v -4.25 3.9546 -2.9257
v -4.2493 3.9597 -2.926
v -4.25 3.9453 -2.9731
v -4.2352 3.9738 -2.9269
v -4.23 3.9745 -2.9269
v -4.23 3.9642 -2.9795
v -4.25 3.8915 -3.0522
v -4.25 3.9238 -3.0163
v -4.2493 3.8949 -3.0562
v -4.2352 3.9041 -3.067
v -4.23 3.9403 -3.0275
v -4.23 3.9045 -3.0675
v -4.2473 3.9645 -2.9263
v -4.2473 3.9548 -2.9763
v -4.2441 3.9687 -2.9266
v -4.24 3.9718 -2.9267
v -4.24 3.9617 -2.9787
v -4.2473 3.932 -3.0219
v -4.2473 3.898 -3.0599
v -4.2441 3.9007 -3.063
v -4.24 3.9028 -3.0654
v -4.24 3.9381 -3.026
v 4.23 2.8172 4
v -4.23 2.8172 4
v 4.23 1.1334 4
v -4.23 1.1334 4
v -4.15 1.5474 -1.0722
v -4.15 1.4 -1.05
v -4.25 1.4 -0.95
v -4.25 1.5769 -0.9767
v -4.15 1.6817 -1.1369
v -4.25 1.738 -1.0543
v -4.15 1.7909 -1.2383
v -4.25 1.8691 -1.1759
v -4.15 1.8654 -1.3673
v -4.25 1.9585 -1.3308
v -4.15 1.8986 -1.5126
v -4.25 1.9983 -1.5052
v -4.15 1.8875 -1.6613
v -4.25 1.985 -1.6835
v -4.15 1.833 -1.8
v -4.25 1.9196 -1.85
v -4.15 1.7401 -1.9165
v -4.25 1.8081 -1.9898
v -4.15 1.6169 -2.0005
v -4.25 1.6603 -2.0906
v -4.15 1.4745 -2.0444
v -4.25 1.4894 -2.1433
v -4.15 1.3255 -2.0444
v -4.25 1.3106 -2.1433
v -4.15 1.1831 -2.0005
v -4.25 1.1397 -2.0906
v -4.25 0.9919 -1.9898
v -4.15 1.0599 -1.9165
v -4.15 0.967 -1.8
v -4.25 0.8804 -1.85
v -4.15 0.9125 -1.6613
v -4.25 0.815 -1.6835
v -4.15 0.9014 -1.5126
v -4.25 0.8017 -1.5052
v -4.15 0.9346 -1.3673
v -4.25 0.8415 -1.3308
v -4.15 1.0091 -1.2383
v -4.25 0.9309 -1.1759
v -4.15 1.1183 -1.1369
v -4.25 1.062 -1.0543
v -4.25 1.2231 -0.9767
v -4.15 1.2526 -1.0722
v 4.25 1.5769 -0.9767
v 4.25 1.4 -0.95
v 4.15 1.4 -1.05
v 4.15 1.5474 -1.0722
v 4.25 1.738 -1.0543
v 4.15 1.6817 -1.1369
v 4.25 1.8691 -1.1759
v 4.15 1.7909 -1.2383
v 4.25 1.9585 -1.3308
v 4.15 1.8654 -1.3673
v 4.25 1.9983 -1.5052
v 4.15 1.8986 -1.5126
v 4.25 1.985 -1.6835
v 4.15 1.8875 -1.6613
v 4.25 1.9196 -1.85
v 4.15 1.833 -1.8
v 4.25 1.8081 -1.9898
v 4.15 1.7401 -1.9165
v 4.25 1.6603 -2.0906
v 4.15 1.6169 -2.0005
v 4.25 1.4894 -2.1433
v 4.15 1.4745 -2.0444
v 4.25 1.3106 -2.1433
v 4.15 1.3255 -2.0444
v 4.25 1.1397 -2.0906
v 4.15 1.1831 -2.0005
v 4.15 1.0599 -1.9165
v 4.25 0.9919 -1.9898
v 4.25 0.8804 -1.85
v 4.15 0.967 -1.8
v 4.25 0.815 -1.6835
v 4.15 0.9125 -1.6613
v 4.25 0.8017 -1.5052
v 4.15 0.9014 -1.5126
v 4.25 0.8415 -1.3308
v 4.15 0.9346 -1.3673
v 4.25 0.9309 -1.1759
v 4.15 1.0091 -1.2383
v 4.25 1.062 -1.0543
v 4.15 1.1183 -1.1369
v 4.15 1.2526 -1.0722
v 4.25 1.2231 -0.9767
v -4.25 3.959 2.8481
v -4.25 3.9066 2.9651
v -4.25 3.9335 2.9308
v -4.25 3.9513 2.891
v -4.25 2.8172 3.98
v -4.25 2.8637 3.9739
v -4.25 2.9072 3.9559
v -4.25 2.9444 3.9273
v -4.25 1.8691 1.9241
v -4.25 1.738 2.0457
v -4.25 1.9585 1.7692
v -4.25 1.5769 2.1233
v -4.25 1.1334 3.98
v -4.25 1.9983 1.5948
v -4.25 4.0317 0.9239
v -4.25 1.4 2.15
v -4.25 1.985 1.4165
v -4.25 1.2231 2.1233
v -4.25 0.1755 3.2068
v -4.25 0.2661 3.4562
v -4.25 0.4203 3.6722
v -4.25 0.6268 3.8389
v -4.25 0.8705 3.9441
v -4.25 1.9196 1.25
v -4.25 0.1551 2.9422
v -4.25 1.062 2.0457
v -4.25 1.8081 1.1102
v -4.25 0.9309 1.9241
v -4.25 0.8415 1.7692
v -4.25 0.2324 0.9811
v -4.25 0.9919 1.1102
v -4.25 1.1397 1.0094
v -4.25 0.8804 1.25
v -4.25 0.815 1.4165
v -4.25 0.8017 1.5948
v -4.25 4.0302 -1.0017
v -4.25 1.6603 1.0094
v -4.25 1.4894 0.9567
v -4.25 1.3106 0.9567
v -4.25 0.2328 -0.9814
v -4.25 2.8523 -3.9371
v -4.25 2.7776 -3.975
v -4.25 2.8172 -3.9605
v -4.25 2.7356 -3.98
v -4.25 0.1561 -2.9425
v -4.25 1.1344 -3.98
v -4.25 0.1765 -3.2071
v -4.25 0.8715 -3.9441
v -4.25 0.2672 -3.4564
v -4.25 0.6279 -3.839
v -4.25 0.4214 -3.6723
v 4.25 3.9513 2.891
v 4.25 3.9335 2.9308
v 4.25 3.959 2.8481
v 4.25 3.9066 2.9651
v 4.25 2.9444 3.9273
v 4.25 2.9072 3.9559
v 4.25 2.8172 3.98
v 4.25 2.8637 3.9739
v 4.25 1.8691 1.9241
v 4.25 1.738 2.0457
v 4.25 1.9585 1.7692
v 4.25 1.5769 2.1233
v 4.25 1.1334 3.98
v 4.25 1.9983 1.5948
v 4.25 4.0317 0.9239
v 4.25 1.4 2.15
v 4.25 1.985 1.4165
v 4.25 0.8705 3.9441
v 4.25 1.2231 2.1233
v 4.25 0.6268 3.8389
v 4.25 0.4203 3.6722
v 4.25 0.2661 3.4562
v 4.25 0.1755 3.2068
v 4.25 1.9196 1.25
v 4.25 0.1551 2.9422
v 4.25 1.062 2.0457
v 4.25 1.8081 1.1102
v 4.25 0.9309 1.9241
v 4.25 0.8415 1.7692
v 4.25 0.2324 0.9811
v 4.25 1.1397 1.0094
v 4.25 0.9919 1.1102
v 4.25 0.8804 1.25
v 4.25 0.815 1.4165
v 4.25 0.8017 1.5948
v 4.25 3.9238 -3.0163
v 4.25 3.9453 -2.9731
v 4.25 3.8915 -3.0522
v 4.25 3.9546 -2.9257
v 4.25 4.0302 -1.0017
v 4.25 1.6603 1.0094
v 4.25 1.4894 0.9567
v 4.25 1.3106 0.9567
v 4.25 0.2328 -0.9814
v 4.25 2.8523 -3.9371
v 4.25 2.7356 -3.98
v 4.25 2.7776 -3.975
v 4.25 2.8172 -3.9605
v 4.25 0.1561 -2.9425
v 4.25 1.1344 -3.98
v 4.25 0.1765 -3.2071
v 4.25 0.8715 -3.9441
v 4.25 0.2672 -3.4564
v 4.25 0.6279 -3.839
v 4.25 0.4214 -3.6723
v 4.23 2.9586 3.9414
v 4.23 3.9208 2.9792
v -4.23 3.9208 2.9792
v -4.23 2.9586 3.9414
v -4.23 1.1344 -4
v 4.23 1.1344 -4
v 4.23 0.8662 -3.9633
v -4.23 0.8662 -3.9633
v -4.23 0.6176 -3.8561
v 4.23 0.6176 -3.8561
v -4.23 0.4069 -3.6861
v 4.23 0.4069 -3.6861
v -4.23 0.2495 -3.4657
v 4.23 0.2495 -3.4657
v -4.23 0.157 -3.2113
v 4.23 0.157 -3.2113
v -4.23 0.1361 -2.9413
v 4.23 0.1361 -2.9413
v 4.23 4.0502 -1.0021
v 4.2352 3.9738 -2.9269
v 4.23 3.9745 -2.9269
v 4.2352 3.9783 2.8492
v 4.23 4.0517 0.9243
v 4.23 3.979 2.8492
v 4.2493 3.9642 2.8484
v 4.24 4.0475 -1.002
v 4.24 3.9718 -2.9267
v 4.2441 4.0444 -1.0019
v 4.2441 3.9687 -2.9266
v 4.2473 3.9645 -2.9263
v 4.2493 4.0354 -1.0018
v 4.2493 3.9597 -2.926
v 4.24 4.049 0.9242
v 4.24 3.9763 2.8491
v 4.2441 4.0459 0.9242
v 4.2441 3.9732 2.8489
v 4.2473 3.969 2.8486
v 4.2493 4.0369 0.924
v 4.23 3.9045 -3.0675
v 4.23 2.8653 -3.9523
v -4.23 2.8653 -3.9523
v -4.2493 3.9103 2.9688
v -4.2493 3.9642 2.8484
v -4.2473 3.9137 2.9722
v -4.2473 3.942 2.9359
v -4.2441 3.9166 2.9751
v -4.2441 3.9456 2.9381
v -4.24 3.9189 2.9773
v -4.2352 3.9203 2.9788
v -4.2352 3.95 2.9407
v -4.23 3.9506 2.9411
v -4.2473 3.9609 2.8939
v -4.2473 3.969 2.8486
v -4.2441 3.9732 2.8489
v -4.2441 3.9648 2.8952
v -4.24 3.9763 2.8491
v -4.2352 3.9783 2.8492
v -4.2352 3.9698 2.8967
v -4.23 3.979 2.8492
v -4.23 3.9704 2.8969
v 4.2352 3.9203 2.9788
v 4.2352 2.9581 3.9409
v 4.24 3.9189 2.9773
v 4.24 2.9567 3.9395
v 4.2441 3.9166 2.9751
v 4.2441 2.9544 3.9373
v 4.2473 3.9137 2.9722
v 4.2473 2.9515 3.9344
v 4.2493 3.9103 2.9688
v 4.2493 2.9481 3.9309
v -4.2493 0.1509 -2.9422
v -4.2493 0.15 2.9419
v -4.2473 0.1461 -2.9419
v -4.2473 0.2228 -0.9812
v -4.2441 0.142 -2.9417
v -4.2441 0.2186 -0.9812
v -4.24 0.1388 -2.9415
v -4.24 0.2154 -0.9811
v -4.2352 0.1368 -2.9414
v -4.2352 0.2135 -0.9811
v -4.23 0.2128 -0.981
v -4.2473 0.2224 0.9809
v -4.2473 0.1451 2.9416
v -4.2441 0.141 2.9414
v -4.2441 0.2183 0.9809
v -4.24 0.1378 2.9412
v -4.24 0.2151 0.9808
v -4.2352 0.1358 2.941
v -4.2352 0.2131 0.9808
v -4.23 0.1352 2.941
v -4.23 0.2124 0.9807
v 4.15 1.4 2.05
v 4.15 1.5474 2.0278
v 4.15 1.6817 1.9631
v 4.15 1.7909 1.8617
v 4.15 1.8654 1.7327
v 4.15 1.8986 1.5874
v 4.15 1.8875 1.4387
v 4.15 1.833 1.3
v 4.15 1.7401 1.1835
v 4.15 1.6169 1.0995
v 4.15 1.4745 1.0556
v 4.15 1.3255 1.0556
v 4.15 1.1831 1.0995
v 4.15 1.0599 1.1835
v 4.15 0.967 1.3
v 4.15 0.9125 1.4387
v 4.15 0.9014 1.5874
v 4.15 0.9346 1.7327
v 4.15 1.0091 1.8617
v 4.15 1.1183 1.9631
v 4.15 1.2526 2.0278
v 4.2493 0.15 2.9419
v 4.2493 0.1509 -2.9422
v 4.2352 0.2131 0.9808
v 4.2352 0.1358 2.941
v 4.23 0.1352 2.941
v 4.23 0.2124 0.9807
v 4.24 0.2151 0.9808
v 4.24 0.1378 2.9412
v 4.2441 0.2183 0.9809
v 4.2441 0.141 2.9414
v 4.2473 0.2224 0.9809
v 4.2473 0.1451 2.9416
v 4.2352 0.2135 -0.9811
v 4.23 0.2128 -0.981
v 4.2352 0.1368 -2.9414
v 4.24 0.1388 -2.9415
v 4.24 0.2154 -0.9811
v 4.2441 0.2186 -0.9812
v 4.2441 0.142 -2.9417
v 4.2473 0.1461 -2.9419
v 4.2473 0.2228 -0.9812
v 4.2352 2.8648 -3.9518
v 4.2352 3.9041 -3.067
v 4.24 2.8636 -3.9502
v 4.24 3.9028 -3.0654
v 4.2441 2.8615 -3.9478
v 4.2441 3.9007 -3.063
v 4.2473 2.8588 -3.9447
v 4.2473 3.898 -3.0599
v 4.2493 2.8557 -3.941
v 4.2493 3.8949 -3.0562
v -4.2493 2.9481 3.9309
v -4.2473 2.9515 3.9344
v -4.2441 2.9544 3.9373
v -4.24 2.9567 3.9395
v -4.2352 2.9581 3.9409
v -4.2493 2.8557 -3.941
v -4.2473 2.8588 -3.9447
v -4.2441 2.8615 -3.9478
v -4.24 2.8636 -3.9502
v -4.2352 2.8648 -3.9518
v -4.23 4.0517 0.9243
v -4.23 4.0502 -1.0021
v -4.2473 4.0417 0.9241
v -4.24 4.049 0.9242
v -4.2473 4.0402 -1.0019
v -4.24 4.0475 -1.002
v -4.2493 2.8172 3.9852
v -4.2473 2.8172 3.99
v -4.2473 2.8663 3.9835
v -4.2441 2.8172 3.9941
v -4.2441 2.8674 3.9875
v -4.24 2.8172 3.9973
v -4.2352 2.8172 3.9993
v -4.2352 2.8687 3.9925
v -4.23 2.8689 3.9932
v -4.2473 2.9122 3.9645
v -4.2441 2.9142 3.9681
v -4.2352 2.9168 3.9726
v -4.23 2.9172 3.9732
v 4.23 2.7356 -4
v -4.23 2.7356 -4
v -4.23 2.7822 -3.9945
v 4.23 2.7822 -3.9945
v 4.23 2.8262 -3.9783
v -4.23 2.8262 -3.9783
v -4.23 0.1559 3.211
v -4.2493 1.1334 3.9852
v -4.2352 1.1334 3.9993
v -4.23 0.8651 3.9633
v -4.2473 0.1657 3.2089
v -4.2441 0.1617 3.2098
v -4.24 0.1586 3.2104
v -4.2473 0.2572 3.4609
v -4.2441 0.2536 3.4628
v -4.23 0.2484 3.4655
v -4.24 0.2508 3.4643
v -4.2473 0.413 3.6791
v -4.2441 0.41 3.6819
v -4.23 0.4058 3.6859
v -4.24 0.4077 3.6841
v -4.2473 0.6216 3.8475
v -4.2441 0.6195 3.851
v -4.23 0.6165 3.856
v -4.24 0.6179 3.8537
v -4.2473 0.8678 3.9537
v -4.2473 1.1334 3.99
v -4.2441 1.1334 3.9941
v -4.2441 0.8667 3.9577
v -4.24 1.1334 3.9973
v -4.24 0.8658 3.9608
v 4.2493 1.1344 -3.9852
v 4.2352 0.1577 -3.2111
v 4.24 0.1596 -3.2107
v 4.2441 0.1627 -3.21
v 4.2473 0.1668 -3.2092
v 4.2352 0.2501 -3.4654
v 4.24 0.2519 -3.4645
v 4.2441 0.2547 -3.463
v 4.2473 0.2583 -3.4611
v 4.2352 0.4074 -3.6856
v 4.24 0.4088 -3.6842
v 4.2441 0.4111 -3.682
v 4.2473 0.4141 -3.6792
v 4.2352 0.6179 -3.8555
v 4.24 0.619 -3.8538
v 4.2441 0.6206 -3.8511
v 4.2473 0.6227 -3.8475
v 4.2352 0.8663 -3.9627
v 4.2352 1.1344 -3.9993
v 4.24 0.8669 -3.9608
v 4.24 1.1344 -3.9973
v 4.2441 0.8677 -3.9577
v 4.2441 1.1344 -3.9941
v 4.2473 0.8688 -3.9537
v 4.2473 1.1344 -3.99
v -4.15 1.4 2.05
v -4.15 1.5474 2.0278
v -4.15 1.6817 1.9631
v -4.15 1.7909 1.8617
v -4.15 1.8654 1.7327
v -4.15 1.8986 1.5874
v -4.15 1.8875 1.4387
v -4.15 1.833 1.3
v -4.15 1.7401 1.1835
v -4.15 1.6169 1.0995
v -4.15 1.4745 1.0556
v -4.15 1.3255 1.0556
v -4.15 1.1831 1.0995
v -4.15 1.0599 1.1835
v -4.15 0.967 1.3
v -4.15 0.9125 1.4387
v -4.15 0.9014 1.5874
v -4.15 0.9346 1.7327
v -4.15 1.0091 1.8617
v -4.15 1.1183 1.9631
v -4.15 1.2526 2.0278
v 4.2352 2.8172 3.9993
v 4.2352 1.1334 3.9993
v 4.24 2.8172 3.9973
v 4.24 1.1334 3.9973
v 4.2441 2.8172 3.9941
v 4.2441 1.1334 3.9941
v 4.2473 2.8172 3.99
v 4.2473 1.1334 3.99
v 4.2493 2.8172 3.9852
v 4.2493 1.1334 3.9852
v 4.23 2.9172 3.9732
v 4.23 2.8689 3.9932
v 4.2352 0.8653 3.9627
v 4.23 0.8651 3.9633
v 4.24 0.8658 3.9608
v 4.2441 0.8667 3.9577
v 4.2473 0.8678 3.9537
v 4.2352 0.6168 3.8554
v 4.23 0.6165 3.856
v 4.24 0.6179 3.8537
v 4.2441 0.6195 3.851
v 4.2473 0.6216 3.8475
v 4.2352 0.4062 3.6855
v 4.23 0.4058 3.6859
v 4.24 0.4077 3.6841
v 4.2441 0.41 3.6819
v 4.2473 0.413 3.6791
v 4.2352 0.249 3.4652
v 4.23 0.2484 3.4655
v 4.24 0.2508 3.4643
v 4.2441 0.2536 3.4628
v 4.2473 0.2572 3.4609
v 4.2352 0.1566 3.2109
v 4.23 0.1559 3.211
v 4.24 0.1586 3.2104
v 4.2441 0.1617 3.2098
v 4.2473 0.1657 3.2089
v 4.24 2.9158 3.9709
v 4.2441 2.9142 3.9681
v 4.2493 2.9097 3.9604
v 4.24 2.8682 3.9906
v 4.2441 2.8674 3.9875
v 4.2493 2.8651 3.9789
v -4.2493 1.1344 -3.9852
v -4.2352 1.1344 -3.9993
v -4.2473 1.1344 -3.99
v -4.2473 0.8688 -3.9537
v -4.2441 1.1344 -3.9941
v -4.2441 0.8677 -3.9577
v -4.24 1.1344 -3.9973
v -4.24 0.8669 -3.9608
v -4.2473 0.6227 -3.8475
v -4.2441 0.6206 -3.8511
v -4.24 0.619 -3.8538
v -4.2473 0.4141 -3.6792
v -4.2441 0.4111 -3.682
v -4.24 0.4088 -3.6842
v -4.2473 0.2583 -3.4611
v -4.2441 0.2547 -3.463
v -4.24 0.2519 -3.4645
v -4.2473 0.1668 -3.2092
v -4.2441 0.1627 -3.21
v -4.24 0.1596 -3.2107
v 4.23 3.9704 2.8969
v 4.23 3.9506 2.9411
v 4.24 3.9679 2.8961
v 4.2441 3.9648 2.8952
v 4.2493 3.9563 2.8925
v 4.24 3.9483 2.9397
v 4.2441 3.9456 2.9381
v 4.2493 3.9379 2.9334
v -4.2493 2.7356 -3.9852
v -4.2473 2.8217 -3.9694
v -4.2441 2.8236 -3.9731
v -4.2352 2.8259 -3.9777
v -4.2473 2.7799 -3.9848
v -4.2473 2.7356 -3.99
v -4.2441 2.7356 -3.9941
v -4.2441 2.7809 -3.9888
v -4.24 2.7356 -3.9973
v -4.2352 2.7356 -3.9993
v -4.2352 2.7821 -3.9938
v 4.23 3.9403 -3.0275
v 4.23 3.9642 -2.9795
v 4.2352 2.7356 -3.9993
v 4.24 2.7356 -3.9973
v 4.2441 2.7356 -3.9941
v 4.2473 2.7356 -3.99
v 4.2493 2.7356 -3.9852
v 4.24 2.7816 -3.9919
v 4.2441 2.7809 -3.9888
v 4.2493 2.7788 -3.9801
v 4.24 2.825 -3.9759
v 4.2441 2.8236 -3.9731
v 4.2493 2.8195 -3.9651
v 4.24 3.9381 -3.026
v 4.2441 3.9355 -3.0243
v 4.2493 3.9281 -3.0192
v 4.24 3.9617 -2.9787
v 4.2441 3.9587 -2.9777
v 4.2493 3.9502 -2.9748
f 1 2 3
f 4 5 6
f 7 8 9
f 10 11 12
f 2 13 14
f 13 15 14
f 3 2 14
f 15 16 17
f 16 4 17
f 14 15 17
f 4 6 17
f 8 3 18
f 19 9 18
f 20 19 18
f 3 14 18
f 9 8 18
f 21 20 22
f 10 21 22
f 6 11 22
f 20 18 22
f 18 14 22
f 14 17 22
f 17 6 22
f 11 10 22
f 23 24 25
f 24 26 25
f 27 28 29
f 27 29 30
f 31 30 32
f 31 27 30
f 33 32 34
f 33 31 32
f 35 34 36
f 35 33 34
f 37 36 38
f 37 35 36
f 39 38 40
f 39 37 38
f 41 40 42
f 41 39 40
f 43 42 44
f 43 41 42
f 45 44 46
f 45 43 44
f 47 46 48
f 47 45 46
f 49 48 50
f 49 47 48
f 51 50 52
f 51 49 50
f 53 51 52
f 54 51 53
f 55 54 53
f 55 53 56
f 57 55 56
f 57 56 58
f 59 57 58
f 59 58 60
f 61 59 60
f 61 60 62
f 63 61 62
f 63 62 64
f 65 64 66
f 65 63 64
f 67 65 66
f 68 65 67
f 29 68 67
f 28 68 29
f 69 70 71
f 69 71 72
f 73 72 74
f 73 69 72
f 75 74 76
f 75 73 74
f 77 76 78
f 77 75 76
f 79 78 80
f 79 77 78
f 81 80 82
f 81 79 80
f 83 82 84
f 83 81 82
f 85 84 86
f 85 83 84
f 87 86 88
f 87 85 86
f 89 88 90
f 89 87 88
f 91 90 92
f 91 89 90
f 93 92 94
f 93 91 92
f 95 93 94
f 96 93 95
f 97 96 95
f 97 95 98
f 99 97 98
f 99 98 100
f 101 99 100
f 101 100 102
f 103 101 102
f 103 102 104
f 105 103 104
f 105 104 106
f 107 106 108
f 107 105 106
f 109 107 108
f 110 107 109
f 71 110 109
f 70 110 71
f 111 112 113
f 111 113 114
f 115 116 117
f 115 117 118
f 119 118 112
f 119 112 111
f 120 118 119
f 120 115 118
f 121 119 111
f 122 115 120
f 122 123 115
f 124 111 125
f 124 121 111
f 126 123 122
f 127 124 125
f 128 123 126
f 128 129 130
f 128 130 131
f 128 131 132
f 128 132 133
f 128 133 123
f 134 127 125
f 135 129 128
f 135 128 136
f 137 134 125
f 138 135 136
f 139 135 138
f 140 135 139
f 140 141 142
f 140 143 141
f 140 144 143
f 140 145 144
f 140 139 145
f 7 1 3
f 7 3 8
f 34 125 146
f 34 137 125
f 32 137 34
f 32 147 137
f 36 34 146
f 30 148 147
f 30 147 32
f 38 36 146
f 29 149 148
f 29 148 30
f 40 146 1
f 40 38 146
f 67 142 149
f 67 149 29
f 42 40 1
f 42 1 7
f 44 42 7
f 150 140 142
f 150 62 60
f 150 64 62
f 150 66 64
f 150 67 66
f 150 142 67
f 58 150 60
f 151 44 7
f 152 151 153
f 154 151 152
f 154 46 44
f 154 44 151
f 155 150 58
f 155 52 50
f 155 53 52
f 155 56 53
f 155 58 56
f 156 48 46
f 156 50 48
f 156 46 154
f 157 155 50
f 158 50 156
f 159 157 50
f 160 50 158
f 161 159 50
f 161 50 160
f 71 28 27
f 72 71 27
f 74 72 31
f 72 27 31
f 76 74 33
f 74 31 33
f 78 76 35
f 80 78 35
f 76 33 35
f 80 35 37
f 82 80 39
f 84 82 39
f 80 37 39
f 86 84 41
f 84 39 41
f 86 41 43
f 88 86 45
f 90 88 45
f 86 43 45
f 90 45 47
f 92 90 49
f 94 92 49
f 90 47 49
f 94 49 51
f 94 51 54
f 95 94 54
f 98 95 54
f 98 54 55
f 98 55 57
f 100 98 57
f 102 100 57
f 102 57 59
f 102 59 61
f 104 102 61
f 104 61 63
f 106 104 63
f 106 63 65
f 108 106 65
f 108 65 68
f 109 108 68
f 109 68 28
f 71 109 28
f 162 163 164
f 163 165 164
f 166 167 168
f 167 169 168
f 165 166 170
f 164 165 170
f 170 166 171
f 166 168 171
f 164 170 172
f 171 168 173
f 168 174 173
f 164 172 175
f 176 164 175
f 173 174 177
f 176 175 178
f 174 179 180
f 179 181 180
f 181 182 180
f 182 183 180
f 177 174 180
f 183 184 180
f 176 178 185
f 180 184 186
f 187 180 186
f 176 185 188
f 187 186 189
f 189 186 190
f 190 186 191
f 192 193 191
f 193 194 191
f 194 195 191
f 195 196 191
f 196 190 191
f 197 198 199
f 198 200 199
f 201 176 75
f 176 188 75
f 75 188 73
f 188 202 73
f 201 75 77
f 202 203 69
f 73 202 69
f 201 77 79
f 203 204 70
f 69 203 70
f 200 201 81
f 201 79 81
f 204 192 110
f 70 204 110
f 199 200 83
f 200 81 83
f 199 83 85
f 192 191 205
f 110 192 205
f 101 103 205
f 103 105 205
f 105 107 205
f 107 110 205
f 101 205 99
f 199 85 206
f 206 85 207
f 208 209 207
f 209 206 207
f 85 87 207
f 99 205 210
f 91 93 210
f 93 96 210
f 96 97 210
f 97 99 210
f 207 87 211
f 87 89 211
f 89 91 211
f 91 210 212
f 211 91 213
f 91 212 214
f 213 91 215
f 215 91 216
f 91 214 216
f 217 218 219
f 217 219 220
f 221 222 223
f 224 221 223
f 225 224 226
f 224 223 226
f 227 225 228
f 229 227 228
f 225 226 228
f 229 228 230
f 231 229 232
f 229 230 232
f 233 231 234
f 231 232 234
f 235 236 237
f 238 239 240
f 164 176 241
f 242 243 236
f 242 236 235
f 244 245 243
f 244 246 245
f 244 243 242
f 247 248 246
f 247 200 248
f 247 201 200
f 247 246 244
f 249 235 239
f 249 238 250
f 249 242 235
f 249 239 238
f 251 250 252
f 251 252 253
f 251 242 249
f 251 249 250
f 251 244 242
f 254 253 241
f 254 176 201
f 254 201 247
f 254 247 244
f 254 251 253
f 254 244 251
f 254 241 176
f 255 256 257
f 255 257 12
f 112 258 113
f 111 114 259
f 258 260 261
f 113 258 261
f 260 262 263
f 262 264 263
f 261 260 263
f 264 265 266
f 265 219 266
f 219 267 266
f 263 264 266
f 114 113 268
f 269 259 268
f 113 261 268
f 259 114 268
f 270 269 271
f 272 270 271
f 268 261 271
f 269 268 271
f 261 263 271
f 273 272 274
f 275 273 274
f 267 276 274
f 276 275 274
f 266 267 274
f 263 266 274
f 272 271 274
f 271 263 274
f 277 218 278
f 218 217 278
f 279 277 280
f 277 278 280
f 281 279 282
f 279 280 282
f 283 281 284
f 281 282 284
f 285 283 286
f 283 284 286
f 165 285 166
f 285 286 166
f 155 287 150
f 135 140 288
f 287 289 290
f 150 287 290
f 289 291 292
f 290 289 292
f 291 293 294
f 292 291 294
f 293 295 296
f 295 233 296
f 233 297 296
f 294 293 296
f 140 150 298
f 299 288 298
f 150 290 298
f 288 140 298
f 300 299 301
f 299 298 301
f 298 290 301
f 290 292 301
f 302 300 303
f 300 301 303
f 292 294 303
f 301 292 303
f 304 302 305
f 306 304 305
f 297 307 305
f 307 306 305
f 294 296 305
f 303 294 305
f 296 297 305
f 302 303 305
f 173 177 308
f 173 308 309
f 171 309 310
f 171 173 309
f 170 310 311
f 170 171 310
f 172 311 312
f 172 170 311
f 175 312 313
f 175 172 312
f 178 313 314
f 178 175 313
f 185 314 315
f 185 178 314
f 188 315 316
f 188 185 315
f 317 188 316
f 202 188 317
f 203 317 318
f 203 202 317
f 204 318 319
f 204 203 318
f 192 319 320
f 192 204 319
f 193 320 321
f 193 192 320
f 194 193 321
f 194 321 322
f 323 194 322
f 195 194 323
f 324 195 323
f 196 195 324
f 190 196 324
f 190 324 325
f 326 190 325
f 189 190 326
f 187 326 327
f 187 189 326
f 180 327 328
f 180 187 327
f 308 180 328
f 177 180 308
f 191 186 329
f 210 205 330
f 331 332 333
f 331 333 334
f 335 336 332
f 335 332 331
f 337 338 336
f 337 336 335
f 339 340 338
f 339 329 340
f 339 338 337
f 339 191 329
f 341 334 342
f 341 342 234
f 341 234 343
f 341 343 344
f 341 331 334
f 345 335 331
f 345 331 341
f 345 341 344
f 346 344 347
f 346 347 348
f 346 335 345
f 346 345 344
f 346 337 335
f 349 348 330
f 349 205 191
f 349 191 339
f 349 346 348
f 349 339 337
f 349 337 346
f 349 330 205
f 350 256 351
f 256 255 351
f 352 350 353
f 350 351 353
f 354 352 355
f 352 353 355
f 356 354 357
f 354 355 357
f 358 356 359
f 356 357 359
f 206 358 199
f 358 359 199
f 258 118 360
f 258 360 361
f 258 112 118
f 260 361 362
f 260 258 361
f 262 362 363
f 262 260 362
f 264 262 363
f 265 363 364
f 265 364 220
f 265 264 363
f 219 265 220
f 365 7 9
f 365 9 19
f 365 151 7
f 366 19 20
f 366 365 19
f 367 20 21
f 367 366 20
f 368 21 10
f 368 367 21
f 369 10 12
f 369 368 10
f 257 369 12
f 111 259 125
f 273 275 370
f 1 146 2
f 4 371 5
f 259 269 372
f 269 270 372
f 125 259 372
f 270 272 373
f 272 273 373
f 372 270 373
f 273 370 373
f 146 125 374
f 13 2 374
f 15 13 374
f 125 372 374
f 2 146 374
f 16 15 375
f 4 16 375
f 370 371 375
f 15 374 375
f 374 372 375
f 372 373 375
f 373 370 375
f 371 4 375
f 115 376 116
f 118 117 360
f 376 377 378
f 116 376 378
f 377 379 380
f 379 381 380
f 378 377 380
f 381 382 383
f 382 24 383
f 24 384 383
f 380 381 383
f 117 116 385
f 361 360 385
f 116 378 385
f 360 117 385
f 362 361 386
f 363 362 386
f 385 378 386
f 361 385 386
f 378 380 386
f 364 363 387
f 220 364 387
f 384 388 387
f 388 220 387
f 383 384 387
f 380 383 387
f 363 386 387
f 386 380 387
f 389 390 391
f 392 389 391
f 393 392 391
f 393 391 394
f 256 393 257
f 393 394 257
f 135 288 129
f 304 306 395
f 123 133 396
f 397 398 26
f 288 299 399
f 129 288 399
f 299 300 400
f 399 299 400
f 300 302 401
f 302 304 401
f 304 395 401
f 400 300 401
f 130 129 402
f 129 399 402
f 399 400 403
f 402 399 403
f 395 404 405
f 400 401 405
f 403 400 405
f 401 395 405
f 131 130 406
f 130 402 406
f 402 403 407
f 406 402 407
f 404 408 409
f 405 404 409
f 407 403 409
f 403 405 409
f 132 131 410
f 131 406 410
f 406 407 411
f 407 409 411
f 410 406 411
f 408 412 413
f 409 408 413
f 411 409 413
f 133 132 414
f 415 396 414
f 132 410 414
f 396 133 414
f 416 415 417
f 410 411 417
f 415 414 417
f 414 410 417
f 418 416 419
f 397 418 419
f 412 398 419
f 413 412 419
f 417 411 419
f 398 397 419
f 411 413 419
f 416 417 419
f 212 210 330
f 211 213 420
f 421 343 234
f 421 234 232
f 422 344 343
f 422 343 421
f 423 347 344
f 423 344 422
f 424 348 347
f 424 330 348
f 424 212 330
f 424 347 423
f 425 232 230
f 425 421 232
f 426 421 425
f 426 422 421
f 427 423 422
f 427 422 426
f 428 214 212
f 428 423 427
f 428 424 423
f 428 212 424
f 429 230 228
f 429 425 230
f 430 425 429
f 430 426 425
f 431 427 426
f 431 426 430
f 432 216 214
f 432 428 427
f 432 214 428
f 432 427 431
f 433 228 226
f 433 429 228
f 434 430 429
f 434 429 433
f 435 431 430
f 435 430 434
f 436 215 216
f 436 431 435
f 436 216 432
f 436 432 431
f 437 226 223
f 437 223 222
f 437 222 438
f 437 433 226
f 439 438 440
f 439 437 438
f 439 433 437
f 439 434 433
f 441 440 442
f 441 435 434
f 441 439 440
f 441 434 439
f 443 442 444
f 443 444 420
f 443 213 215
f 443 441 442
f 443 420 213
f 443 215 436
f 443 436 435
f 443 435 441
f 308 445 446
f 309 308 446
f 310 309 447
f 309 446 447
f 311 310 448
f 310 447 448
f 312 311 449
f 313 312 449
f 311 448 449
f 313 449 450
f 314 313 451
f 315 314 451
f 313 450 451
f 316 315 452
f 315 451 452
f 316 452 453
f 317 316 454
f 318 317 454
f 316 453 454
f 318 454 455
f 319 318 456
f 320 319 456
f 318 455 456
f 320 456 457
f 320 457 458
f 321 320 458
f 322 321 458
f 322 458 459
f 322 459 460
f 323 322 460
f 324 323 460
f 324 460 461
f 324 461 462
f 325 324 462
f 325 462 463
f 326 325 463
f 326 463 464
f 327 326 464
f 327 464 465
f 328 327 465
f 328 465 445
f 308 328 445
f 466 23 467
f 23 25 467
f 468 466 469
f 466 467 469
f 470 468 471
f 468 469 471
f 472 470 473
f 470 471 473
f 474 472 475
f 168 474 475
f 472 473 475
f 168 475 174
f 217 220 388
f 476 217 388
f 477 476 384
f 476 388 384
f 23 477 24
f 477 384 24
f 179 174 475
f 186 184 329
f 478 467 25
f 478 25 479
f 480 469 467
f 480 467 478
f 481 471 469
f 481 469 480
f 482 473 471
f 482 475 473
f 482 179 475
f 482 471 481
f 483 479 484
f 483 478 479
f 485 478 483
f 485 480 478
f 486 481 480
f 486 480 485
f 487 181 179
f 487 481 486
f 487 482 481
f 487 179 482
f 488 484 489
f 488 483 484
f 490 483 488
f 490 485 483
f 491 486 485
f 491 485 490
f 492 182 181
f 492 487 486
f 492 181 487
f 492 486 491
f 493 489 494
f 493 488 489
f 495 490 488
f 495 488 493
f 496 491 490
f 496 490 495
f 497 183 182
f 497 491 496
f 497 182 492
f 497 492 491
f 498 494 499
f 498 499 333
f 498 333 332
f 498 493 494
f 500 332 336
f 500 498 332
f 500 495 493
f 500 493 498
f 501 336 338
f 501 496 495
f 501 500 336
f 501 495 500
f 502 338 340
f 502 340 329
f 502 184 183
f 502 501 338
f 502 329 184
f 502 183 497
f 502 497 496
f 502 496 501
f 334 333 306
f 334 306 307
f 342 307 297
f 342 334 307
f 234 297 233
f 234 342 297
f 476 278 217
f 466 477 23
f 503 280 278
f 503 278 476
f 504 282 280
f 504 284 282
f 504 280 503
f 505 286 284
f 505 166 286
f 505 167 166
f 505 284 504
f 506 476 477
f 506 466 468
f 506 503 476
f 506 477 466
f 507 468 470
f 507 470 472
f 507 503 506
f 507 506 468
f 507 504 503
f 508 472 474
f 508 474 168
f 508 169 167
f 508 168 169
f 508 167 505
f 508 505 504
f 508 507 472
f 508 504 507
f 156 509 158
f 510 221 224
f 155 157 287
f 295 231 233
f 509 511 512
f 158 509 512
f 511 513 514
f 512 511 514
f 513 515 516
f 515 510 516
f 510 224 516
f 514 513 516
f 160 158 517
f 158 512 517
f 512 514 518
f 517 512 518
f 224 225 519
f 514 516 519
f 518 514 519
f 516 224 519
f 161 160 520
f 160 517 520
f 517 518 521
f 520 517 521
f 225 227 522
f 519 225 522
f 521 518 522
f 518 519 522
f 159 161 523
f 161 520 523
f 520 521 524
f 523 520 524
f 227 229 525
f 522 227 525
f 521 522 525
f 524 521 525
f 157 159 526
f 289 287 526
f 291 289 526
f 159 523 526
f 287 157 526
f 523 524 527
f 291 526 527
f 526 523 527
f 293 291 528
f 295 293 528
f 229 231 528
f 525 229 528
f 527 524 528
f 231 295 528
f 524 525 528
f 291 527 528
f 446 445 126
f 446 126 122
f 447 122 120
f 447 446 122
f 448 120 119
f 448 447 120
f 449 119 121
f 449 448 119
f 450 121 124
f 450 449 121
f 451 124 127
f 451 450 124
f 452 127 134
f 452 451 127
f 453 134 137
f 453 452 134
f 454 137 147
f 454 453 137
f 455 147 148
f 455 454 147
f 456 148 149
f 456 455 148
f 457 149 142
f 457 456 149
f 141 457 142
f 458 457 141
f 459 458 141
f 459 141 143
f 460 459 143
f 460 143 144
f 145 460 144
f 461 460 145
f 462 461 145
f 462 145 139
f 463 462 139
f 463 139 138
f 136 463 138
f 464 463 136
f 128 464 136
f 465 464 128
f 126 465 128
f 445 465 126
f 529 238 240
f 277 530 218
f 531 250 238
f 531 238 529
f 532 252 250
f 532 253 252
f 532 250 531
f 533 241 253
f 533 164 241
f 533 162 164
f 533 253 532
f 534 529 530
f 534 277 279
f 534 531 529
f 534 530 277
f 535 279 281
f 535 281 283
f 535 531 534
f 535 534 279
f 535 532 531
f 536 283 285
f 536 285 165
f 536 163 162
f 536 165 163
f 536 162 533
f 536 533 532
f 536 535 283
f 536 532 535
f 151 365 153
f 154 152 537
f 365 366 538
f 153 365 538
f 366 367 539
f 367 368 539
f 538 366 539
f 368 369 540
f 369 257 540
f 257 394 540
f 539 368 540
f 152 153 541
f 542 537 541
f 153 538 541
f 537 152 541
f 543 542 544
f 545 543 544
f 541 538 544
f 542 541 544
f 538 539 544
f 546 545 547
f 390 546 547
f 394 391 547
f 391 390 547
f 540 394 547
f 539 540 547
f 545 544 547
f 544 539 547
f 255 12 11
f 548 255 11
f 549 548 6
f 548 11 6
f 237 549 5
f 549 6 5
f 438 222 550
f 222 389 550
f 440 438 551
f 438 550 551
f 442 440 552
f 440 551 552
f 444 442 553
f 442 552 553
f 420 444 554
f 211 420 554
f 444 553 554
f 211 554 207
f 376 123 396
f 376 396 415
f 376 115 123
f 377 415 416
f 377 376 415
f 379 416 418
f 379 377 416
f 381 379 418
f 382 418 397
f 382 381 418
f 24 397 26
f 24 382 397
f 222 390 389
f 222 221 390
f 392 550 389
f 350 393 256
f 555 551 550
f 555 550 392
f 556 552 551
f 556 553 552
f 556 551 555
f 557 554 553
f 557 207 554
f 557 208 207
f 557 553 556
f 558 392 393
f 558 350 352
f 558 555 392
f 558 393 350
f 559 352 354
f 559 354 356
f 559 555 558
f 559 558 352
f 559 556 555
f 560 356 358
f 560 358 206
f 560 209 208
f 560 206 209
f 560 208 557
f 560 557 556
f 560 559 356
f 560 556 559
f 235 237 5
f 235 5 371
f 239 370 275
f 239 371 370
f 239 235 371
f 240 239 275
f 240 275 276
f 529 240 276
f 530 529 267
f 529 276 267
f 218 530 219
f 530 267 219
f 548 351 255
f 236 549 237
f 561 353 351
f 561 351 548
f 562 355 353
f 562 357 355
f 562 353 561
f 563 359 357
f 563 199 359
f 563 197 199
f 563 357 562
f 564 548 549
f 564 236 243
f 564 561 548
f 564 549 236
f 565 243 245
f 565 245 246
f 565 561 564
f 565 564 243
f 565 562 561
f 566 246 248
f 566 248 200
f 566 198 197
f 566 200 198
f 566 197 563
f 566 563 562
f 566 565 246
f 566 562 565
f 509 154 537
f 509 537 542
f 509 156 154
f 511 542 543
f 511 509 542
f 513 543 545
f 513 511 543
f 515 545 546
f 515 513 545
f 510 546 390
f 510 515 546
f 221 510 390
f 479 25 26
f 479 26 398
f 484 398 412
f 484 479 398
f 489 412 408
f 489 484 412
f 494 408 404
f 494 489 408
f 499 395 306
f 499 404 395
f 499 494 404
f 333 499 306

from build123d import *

# Parameters (mm, degrees)
SKETCH1_W           = 8.5
SKETCH1_H           = 8
BOSS_EXTRUDE1_DEPTH = 4.2
CUT_EXTRUDE1_DEPTH  = 14.2
CHAMFER1_SIZE       = 1.090756547
CHAMFER1_SIZE_2     = 1
FILLET1_R           = 1
FILLET2_R           = 0.2
FILLET3_R           = 0.02
SKETCH3_R           = 0.5
CUT_EXTRUDE2_DEPTH  = 14.2
CHAMFER2_SIZE       = 0.1


with BuildPart() as part:
    # Sketch1 → Boss-Extrude1 (new body)
    with BuildSketch(Plane(origin=(0, 0, 0), x_dir=(1, 0, 0), z_dir=(0, 1, 0))):
        Rectangle(SKETCH1_W, SKETCH1_H)
    extrude(amount=BOSS_EXTRUDE1_DEPTH)

    # Sketch2 → Cut-Extrude1 (cut)
    with BuildSketch(Plane(origin=(4.25, 0, 0), x_dir=(0, 0, -1), z_dir=(1, 0, 0))):
        with BuildLine():
            Line((-4, 3.9), (-5.253535024, 5.241651662))
            Line((-5.253535024, 5.241651662), (3.889156526, 7.141243929))
            Line((3.889156526, 7.141243929), (5.679183493, 5.077233243))
            Line((5.679183493, 5.077233243), (4, 3.9))
            ThreePointArc((4, 3.9), (0, 4.060256822), (-4, 3.9))
        make_face()
        with BuildLine():
            Line((4.717394395, 0), (0, -2.904825783))
            Line((0, -2.904825783), (-4.70037365, 0))
            ThreePointArc((-4.70037365, 0), (0.008510373, 0.222229748), (4.717394395, 0))
        make_face()
    extrude(amount=-CUT_EXTRUDE1_DEPTH, mode=Mode.SUBTRACT)

    # Chamfer1
    # the kernel refuses this chamfer: 1.090756547, 1 mm, written as the material it takes off along each edge
    with BuildSketch(Plane(origin=(7.060832105, 3.9, -4), x_dir=(0, -1, 0), z_dir=(-1, 0, 0))) as chamfer1_piece_1:
        with BuildLine():
            Line((CHAMFER1_SIZE, 0), (-0.069441157, 0.98780495))
            ThreePointArc((-0.069441157, 0.98780495), (-0.038234412, 0.508961249), (0, 0))
            Line((0, 0), (CHAMFER1_SIZE, 0))
        make_face()
    extrude(amount=14.12166421, mode=Mode.SUBTRACT)
    with BuildSketch(Plane(origin=(7.026184696, 3.9, 4), x_dir=(0, 0.06925797782051132, -0.9975987833333668), z_dir=(-1, 0, 0))) as chamfer1_piece_2:
        with BuildLine():
            Line((1.077190612, 0), (-CHAMFER1_SIZE_2 * 0.0692579778205, CHAMFER1_SIZE_2 * 0.997598783333))
            Line((-CHAMFER1_SIZE_2 * 0.0692579778205, CHAMFER1_SIZE_2 * 0.997598783333), (0, 0))
            ThreePointArc((0, 0), (0.555048482, -0.002898226), (1.077190612, 0))
        make_face()
    extrude(amount=14.052369392, mode=Mode.SUBTRACT)

    # Fillet1
    fillet1_edges = [part.edges().sort_by_distance(p)[0] for p in [
        (0, 0.062655213, -4),
        (0, 0.061289175, 4),
    ]]
    fillet(fillet1_edges, radius=FILLET1_R)

    # Fillet2
    fillet2_edges = [part.edges().sort_by_distance(p)[0] for p in [
        (0, 2.809243453, -4),
        (0, 3.974604043, 2.925395957),
        (0, 3.969441157, -3.01219505),
        (0, 2.9, 4),
    ]]
    fillet(fillet2_edges, radius=FILLET2_R)

    # Fillet3
    fillet3_edges = [part.edges().sort_by_distance(p)[0] for p in [
        (4.25, 0.222229049, -0.000152397),
        (4.25, 0.406869221, -3.686055151),
        (4.25, 0.405751593, 3.685933525),
        (-4.25, 0.222229049, -0.000152397),
        (-4.25, 0.406869221, -3.686055151),
        (-4.25, 0.405751593, 3.685933525),
        (4.25, 1.93502694, -4),
        (-4.25, 1.93502694, -4),
        (4.25, 1.975286544, 4),
        (4.25, 3.384901314, -3.509878633),
        (4.25, 4.060241686, -0.03890618),
        (4.25, 3.439667659, 3.460332341),
        (4.25, 2.893693974, 3.984775907),
        (4.25, 3.961854563, 2.919594368),
        (4.25, 3.953888859, -3.004346497),
        (4.25, 2.804713491, -3.987691713),
        (-4.25, 3.384901314, -3.509878633),
        (-4.25, 1.975286544, 4),
        (-4.25, 3.439667659, 3.460332341),
        (-4.25, 4.060241686, -0.03890618),
        (-4.25, 2.893693974, 3.984775907),
        (-4.25, 3.961854563, 2.919594368),
        (-4.25, 3.953888859, -3.004346497),
        (-4.25, 2.804713491, -3.987691713),
    ]]
    fillet(fillet3_edges, radius=FILLET3_R)

    # Sketch3 → Cut-Extrude2 (cut)
    with BuildSketch(Plane.ZY.offset(4.25)):
        with Locations((-1.55, 1.4)):
            Circle(SKETCH3_R)
        with Locations((1.55, 1.4)):
            Circle(SKETCH3_R)
    extrude(amount=-CUT_EXTRUDE2_DEPTH, mode=Mode.SUBTRACT)

    # Chamfer2
    chamfer2_edges = [part.edges().sort_by_distance(p)[0] for p in [
        (4.25, 1.4, -2.05),
        (-4.25, 1.4, -2.05),
        (4.25, 1.4, 1.05),
        (-4.25, 1.4, 1.05),
    ]]
    chamfer(chamfer2_edges, length=CHAMFER2_SIZE)


solid = part.part
